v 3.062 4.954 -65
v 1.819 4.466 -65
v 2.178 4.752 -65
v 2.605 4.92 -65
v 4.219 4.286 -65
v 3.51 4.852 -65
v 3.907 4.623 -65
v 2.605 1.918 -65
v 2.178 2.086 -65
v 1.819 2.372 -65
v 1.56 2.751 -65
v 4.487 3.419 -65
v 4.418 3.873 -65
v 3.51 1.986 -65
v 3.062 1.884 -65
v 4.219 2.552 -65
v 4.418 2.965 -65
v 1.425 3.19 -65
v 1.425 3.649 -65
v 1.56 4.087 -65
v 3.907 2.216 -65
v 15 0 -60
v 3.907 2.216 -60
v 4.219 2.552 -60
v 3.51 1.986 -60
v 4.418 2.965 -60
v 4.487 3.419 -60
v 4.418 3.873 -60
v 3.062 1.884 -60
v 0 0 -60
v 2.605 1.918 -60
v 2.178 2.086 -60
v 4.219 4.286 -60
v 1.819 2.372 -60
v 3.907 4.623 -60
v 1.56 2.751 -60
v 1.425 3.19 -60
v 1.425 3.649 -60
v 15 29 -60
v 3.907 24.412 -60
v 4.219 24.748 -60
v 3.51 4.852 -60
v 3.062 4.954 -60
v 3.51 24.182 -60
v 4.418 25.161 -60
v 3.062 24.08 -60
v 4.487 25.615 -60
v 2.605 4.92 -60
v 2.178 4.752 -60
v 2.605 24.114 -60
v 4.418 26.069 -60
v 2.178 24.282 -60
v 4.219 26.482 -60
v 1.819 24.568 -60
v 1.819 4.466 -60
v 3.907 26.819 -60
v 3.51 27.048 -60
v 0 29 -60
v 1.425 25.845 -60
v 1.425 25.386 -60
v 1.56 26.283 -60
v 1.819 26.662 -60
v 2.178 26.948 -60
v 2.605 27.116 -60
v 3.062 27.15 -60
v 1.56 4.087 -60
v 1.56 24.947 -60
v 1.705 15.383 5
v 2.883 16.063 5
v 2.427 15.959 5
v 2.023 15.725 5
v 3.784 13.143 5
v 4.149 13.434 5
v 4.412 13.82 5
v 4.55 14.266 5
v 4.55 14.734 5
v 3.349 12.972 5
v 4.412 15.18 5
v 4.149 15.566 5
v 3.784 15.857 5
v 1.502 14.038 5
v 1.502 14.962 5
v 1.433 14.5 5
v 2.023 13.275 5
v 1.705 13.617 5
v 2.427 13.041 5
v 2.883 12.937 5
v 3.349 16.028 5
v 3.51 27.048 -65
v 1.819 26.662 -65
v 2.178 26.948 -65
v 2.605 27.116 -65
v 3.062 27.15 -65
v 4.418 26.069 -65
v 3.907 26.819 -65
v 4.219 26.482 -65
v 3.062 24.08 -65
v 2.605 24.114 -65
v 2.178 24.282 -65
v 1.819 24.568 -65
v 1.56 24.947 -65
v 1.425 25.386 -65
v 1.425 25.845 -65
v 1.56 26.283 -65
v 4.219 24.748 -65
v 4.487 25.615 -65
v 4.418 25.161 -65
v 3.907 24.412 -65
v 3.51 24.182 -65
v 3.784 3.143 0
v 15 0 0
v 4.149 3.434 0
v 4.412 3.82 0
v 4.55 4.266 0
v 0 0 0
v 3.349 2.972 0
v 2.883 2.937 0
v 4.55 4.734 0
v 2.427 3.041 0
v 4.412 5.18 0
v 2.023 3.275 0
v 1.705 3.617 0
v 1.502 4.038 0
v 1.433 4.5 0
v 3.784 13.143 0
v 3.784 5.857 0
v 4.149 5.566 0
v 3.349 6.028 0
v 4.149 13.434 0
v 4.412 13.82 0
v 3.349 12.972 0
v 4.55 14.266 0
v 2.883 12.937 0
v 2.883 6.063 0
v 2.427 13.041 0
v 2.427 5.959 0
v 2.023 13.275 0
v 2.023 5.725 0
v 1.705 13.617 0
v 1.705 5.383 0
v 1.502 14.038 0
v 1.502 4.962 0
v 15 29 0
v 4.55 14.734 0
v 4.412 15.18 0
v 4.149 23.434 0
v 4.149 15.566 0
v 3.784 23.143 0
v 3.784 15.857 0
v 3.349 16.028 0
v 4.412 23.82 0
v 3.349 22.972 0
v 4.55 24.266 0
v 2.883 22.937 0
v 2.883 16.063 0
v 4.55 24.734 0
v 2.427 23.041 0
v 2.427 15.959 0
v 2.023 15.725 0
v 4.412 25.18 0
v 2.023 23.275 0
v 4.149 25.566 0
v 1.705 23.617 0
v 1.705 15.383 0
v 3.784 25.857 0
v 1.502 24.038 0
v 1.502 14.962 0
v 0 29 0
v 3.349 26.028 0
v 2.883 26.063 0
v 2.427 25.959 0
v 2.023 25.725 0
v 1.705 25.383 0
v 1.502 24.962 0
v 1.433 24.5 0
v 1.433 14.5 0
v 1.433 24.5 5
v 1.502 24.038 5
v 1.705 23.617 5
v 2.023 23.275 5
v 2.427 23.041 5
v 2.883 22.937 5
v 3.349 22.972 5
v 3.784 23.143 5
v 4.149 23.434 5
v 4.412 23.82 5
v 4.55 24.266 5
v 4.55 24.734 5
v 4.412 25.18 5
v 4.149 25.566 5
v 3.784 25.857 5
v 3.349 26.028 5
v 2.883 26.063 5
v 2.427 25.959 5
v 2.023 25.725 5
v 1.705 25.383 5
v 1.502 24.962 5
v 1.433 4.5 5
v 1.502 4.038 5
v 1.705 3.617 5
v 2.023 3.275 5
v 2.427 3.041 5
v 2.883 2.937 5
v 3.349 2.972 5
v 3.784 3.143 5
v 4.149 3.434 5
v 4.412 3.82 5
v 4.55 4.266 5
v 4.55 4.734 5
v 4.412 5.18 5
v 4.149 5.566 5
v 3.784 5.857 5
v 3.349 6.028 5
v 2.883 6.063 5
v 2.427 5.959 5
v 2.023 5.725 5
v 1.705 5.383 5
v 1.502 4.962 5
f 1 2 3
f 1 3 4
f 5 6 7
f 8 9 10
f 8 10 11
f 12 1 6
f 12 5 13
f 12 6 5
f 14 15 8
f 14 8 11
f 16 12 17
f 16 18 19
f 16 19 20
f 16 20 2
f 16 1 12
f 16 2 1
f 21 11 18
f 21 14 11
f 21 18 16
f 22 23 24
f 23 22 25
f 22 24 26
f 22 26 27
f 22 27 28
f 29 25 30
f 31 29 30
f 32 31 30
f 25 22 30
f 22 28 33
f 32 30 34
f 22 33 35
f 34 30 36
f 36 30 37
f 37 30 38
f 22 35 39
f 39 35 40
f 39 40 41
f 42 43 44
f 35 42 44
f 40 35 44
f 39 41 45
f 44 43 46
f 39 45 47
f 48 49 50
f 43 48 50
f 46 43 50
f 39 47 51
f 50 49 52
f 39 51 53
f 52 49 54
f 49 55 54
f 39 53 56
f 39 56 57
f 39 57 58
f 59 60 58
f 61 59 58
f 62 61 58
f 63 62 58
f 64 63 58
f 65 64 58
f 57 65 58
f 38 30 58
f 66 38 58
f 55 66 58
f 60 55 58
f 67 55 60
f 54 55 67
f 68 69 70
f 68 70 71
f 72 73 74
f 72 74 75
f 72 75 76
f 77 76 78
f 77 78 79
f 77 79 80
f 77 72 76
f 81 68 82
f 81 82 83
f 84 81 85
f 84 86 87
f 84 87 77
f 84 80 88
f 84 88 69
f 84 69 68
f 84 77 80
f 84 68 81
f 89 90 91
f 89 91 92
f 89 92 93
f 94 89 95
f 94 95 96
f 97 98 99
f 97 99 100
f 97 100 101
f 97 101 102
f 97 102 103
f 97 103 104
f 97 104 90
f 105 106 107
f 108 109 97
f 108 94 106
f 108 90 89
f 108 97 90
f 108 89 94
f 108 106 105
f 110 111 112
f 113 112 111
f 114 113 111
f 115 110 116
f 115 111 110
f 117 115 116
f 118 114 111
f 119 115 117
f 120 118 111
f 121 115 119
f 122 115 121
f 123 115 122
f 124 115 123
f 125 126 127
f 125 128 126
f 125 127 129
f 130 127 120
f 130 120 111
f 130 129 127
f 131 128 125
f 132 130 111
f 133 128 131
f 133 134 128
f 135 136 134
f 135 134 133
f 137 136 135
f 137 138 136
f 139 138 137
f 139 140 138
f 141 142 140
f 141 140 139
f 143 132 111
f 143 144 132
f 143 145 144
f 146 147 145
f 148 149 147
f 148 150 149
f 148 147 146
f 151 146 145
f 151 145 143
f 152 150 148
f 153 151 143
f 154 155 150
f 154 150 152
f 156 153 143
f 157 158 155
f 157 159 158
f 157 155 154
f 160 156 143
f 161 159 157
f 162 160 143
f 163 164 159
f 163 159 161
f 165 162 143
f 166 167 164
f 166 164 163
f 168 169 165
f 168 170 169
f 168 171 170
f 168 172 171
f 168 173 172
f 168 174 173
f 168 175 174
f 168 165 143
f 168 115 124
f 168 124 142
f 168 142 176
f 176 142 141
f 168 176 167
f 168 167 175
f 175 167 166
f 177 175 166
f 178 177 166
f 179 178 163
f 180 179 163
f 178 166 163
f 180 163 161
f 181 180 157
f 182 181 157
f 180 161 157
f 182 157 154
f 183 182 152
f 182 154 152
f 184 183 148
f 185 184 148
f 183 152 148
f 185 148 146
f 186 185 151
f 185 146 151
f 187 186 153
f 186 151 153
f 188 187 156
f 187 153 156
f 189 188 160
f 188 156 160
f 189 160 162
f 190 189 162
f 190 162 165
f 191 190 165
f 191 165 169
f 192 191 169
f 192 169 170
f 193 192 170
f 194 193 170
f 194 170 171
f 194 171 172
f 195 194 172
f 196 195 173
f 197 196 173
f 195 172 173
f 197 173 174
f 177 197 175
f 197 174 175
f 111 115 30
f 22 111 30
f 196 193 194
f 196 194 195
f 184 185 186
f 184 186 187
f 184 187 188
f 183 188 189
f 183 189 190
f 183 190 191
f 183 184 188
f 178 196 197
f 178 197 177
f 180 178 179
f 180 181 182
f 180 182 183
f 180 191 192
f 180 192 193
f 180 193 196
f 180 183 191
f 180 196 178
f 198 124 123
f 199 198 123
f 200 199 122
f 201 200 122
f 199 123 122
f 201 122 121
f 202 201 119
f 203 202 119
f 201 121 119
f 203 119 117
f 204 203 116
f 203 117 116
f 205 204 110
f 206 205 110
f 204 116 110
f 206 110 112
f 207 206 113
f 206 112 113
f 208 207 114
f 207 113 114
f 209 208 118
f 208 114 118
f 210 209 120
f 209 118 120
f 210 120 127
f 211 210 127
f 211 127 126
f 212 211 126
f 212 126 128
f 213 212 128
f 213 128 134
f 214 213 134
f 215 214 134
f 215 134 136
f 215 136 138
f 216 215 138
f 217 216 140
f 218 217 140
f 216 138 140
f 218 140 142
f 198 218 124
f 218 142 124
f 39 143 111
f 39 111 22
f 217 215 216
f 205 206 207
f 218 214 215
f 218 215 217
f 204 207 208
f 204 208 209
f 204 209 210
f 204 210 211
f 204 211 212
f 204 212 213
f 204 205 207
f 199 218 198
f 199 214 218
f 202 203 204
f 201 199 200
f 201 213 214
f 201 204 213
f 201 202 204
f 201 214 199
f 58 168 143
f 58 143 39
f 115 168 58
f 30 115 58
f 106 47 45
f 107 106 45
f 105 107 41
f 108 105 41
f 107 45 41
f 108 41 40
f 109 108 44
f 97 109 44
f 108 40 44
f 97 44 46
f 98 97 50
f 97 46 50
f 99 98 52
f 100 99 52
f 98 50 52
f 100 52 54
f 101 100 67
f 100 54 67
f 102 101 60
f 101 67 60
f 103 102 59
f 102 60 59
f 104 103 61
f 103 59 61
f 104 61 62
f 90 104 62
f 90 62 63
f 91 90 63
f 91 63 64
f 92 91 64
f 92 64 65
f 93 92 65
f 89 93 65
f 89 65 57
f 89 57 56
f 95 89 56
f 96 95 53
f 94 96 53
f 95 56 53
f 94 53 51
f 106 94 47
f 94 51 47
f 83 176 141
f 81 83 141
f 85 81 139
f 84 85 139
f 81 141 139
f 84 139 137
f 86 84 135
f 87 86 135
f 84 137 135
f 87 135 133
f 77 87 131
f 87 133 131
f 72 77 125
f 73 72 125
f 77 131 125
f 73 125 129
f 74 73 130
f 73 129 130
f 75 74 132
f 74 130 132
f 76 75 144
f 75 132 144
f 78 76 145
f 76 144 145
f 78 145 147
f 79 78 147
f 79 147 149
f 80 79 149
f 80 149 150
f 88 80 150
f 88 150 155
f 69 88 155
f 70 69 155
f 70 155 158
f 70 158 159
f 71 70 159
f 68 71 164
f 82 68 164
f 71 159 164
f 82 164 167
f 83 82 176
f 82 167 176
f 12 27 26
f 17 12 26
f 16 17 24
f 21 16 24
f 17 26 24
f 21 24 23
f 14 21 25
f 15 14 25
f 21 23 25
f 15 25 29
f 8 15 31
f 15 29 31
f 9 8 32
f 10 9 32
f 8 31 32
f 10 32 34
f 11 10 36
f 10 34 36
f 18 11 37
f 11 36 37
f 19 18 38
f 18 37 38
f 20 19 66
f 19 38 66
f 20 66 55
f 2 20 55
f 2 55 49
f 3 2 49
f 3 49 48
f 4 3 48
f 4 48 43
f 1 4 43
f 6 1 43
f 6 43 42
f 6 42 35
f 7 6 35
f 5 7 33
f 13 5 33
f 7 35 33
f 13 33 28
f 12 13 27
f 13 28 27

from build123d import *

# Parameters (mm, degrees)
SKETCH1_W           = 60
SKETCH1_H           = 29
BOSS_EXTRUDE1_DEPTH = 15
SKETCH2_R           = 1.567394172
BOSS_EXTRUDE2_DEPTH = 5
SKETCH3_R           = 1.539361
BOSS_EXTRUDE3_DEPTH = 5


with BuildPart() as part:
    # Sketch1 → Boss-Extrude1 (new body)
    with BuildSketch(Plane(origin=(0, 0, 0), x_dir=(0, 0, -1), z_dir=(1, 0, 0))):
        with Locations((30, 14.5)):
            Rectangle(SKETCH1_W, SKETCH1_H)
    extrude(amount=BOSS_EXTRUDE1_DEPTH)

    # Sketch2 → Boss-Extrude2 (add)
    with BuildSketch(Plane.XY):
        with Locations(Location((3, 24.5, 0), (0, 0, 180))):
            Circle(SKETCH2_R)
        with Locations(Location((3, 14.5, 0), (0, 0, 180))):
            Circle(SKETCH2_R)
        with Locations(Location((3, 4.5, 0), (0, 0, 180))):
            Circle(SKETCH2_R)
    extrude(amount=BOSS_EXTRUDE2_DEPTH)

    # Sketch3 → Boss-Extrude3 (add)
    with BuildSketch(Plane(origin=(0, 0, -60), x_dir=(-1, 0, 0), z_dir=(0, 0, -1))):
        with Locations(Location((-2.947414971, 25.615179296, 0), (0, 0, 180))):
            Circle(SKETCH3_R)
        with Locations(Location((-2.947414971, 3.419179836, 0), (0, 0, 180))):
            Circle(SKETCH3_R)
    extrude(amount=BOSS_EXTRUDE3_DEPTH)


solid = part.part
